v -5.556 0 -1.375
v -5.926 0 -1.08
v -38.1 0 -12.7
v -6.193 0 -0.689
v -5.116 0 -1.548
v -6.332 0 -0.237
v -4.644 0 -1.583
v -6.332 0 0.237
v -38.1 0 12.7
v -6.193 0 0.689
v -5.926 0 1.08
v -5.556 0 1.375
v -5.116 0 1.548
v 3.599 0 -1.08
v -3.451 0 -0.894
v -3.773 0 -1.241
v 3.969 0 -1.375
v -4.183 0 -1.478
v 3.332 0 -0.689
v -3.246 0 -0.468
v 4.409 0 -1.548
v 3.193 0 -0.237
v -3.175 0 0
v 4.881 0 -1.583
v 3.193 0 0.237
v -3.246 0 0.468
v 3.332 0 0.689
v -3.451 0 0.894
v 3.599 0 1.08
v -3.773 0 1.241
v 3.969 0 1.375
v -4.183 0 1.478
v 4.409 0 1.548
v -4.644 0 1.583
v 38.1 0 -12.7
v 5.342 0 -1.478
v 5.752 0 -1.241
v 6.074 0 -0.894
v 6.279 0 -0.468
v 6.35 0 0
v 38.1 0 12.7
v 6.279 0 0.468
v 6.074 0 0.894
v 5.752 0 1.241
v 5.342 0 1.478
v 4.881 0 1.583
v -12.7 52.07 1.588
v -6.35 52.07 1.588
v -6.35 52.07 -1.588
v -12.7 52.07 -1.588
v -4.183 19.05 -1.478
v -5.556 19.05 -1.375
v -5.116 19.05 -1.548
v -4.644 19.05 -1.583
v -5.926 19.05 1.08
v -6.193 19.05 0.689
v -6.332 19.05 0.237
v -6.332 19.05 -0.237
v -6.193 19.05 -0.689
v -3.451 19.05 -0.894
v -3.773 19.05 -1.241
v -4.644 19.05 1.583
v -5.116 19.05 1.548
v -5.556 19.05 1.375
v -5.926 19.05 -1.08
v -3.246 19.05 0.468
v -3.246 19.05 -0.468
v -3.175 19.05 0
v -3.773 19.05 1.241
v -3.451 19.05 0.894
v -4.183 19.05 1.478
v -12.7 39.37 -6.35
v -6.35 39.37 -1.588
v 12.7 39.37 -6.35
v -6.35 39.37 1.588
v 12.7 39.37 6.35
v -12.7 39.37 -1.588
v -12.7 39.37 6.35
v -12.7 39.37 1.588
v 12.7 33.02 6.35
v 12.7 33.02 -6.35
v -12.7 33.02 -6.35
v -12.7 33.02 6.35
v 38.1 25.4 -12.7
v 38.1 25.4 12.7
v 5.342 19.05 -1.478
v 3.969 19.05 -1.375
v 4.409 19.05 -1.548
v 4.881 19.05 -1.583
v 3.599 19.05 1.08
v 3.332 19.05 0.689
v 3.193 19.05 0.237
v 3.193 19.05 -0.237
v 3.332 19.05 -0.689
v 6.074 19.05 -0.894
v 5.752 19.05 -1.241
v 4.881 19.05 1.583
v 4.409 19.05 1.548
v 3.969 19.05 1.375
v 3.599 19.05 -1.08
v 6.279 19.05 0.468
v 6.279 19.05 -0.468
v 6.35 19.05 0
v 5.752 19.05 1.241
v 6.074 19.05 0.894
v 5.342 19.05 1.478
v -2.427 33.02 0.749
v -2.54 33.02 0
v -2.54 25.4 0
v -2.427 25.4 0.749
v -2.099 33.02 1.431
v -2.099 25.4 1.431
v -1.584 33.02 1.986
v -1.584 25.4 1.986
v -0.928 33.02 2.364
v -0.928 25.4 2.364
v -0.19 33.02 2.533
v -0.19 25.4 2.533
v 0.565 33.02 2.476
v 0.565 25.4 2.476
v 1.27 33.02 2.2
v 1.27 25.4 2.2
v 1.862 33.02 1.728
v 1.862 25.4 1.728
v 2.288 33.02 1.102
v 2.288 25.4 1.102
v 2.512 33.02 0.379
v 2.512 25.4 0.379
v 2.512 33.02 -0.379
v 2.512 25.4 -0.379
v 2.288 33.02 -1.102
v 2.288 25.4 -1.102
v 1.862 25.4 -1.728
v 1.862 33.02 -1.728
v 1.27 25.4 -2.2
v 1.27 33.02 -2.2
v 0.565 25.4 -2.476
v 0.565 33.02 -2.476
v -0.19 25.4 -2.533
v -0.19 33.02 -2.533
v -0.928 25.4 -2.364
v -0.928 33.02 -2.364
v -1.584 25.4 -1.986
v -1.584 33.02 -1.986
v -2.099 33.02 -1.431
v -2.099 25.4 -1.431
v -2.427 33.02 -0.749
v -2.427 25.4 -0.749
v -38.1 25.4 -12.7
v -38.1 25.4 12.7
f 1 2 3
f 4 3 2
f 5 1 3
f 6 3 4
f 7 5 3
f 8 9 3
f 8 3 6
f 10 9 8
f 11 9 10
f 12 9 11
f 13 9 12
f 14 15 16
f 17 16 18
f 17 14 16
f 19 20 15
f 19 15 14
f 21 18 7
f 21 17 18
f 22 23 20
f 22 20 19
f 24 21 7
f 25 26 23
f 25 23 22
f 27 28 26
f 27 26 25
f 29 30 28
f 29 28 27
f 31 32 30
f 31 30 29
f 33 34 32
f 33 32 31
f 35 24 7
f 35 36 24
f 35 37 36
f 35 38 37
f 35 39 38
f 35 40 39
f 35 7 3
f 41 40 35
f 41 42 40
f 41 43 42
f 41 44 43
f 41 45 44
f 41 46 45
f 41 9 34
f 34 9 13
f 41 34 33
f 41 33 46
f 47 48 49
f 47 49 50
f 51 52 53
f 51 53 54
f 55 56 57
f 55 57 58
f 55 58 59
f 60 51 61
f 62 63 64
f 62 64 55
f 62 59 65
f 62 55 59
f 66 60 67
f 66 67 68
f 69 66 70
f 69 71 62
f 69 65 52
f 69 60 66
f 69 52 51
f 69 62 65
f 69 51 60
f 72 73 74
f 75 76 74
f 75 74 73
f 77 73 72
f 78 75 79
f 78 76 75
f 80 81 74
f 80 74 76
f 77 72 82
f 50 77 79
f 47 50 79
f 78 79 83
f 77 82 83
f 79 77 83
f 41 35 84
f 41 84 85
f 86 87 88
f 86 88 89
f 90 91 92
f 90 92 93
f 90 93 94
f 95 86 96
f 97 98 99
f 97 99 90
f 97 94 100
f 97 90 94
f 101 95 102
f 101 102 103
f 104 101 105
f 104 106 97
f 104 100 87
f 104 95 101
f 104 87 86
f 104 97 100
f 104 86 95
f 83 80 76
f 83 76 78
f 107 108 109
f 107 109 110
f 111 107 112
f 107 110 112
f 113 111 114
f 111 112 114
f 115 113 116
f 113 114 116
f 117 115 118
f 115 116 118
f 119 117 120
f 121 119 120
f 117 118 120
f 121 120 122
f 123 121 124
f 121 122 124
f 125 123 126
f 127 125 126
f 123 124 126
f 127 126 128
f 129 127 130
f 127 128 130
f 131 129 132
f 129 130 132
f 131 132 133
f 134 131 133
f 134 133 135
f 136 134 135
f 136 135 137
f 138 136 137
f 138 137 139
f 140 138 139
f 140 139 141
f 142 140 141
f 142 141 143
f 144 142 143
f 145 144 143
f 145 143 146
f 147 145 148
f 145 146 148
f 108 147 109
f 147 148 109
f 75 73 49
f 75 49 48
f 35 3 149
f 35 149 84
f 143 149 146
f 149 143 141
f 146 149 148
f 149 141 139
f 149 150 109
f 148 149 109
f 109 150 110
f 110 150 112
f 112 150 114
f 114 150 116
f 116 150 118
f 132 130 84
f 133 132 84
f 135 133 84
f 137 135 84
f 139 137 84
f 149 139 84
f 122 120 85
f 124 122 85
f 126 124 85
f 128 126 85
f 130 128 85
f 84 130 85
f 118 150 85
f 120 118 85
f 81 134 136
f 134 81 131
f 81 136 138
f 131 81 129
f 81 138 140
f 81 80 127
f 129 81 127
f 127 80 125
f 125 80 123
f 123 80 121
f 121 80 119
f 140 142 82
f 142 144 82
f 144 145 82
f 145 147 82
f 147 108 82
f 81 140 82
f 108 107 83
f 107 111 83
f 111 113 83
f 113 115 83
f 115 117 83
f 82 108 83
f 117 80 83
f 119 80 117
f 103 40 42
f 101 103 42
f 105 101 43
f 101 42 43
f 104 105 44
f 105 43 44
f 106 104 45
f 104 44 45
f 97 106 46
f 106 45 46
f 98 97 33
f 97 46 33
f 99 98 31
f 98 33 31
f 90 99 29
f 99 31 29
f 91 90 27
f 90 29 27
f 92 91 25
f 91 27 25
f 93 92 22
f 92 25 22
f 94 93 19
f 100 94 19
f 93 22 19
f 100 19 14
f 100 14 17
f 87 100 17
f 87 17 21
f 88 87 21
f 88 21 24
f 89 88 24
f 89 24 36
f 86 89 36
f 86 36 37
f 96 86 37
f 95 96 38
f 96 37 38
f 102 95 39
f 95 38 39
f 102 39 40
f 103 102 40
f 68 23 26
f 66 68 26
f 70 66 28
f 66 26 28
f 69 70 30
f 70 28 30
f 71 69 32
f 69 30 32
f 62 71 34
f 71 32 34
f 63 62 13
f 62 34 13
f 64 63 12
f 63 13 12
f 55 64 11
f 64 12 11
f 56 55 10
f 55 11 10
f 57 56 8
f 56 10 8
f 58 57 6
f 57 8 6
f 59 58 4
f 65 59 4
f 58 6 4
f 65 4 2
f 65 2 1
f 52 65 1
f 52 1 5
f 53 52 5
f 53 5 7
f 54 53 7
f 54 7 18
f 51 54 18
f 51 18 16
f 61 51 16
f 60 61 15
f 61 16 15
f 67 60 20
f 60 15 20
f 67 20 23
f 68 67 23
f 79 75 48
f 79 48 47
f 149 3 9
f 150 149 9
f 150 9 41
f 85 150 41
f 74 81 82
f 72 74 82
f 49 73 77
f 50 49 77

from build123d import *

# Parameters (mm, degrees)
F0_W     = 76.2
F0_H     = 25.4
F0_R     = 1.5875
F1_DEPTH = 25.4
F2_R     = 2.54
F3_DEPTH = 7.62
F4_W     = 25.4
F4_H     = 12.7
F5_DEPTH = 6.35
F6_W     = 6.35
F6_H     = 3.175
F7_DEPTH = 12.7
F8_DEPTH = 19.05


with BuildPart() as f1:
    # F0 (on Front) → F1 (new body)
    with BuildSketch(Plane.XZ):
        Rectangle(F0_W, F0_H)
        with Locations((-4.7625, 0)):
            Circle(F0_R, mode=Mode.SUBTRACT)
        with Locations((4.7625, 0)):
            Circle(F0_R, mode=Mode.SUBTRACT)
        with Locations((-4.7625, 0)):
            Circle(F0_R)
        with Locations((4.7625, 0)):
            Circle(F0_R)
    extrude(amount=-F1_DEPTH)

    # F2 (on face) → F3 (join)
    with BuildSketch(Plane(origin=(0, 25.4, 0), x_dir=(-1, 0, 0), z_dir=(0, 1, 0))):
        Circle(F2_R)
    extrude(amount=F3_DEPTH)

    # F4 (on face) → F5 (join)
    with BuildSketch(Plane(origin=(0, 33.02, 0), x_dir=(-1, 0, 0), z_dir=(0, 1, 0))):
        Rectangle(F4_W, F4_H)
    extrude(amount=F5_DEPTH)

    # F6 (on face) → F7 (join)
    with BuildSketch(Plane(origin=(0, 39.37, 0), x_dir=(-1, 0, 0), z_dir=(0, 1, 0))):
        with Locations((9.525, 0)):
            Rectangle(F6_W, F6_H)
    extrude(amount=F7_DEPTH)

    # F0 (on Front) → F8 (cut)
    with BuildSketch(Plane.XZ):
        with Locations((-4.7625, 0)):
            Circle(F0_R)
        with Locations((4.7625, 0)):
            Circle(F0_R)
    extrude(amount=-F8_DEPTH, mode=Mode.SUBTRACT)


solid = f1.part
